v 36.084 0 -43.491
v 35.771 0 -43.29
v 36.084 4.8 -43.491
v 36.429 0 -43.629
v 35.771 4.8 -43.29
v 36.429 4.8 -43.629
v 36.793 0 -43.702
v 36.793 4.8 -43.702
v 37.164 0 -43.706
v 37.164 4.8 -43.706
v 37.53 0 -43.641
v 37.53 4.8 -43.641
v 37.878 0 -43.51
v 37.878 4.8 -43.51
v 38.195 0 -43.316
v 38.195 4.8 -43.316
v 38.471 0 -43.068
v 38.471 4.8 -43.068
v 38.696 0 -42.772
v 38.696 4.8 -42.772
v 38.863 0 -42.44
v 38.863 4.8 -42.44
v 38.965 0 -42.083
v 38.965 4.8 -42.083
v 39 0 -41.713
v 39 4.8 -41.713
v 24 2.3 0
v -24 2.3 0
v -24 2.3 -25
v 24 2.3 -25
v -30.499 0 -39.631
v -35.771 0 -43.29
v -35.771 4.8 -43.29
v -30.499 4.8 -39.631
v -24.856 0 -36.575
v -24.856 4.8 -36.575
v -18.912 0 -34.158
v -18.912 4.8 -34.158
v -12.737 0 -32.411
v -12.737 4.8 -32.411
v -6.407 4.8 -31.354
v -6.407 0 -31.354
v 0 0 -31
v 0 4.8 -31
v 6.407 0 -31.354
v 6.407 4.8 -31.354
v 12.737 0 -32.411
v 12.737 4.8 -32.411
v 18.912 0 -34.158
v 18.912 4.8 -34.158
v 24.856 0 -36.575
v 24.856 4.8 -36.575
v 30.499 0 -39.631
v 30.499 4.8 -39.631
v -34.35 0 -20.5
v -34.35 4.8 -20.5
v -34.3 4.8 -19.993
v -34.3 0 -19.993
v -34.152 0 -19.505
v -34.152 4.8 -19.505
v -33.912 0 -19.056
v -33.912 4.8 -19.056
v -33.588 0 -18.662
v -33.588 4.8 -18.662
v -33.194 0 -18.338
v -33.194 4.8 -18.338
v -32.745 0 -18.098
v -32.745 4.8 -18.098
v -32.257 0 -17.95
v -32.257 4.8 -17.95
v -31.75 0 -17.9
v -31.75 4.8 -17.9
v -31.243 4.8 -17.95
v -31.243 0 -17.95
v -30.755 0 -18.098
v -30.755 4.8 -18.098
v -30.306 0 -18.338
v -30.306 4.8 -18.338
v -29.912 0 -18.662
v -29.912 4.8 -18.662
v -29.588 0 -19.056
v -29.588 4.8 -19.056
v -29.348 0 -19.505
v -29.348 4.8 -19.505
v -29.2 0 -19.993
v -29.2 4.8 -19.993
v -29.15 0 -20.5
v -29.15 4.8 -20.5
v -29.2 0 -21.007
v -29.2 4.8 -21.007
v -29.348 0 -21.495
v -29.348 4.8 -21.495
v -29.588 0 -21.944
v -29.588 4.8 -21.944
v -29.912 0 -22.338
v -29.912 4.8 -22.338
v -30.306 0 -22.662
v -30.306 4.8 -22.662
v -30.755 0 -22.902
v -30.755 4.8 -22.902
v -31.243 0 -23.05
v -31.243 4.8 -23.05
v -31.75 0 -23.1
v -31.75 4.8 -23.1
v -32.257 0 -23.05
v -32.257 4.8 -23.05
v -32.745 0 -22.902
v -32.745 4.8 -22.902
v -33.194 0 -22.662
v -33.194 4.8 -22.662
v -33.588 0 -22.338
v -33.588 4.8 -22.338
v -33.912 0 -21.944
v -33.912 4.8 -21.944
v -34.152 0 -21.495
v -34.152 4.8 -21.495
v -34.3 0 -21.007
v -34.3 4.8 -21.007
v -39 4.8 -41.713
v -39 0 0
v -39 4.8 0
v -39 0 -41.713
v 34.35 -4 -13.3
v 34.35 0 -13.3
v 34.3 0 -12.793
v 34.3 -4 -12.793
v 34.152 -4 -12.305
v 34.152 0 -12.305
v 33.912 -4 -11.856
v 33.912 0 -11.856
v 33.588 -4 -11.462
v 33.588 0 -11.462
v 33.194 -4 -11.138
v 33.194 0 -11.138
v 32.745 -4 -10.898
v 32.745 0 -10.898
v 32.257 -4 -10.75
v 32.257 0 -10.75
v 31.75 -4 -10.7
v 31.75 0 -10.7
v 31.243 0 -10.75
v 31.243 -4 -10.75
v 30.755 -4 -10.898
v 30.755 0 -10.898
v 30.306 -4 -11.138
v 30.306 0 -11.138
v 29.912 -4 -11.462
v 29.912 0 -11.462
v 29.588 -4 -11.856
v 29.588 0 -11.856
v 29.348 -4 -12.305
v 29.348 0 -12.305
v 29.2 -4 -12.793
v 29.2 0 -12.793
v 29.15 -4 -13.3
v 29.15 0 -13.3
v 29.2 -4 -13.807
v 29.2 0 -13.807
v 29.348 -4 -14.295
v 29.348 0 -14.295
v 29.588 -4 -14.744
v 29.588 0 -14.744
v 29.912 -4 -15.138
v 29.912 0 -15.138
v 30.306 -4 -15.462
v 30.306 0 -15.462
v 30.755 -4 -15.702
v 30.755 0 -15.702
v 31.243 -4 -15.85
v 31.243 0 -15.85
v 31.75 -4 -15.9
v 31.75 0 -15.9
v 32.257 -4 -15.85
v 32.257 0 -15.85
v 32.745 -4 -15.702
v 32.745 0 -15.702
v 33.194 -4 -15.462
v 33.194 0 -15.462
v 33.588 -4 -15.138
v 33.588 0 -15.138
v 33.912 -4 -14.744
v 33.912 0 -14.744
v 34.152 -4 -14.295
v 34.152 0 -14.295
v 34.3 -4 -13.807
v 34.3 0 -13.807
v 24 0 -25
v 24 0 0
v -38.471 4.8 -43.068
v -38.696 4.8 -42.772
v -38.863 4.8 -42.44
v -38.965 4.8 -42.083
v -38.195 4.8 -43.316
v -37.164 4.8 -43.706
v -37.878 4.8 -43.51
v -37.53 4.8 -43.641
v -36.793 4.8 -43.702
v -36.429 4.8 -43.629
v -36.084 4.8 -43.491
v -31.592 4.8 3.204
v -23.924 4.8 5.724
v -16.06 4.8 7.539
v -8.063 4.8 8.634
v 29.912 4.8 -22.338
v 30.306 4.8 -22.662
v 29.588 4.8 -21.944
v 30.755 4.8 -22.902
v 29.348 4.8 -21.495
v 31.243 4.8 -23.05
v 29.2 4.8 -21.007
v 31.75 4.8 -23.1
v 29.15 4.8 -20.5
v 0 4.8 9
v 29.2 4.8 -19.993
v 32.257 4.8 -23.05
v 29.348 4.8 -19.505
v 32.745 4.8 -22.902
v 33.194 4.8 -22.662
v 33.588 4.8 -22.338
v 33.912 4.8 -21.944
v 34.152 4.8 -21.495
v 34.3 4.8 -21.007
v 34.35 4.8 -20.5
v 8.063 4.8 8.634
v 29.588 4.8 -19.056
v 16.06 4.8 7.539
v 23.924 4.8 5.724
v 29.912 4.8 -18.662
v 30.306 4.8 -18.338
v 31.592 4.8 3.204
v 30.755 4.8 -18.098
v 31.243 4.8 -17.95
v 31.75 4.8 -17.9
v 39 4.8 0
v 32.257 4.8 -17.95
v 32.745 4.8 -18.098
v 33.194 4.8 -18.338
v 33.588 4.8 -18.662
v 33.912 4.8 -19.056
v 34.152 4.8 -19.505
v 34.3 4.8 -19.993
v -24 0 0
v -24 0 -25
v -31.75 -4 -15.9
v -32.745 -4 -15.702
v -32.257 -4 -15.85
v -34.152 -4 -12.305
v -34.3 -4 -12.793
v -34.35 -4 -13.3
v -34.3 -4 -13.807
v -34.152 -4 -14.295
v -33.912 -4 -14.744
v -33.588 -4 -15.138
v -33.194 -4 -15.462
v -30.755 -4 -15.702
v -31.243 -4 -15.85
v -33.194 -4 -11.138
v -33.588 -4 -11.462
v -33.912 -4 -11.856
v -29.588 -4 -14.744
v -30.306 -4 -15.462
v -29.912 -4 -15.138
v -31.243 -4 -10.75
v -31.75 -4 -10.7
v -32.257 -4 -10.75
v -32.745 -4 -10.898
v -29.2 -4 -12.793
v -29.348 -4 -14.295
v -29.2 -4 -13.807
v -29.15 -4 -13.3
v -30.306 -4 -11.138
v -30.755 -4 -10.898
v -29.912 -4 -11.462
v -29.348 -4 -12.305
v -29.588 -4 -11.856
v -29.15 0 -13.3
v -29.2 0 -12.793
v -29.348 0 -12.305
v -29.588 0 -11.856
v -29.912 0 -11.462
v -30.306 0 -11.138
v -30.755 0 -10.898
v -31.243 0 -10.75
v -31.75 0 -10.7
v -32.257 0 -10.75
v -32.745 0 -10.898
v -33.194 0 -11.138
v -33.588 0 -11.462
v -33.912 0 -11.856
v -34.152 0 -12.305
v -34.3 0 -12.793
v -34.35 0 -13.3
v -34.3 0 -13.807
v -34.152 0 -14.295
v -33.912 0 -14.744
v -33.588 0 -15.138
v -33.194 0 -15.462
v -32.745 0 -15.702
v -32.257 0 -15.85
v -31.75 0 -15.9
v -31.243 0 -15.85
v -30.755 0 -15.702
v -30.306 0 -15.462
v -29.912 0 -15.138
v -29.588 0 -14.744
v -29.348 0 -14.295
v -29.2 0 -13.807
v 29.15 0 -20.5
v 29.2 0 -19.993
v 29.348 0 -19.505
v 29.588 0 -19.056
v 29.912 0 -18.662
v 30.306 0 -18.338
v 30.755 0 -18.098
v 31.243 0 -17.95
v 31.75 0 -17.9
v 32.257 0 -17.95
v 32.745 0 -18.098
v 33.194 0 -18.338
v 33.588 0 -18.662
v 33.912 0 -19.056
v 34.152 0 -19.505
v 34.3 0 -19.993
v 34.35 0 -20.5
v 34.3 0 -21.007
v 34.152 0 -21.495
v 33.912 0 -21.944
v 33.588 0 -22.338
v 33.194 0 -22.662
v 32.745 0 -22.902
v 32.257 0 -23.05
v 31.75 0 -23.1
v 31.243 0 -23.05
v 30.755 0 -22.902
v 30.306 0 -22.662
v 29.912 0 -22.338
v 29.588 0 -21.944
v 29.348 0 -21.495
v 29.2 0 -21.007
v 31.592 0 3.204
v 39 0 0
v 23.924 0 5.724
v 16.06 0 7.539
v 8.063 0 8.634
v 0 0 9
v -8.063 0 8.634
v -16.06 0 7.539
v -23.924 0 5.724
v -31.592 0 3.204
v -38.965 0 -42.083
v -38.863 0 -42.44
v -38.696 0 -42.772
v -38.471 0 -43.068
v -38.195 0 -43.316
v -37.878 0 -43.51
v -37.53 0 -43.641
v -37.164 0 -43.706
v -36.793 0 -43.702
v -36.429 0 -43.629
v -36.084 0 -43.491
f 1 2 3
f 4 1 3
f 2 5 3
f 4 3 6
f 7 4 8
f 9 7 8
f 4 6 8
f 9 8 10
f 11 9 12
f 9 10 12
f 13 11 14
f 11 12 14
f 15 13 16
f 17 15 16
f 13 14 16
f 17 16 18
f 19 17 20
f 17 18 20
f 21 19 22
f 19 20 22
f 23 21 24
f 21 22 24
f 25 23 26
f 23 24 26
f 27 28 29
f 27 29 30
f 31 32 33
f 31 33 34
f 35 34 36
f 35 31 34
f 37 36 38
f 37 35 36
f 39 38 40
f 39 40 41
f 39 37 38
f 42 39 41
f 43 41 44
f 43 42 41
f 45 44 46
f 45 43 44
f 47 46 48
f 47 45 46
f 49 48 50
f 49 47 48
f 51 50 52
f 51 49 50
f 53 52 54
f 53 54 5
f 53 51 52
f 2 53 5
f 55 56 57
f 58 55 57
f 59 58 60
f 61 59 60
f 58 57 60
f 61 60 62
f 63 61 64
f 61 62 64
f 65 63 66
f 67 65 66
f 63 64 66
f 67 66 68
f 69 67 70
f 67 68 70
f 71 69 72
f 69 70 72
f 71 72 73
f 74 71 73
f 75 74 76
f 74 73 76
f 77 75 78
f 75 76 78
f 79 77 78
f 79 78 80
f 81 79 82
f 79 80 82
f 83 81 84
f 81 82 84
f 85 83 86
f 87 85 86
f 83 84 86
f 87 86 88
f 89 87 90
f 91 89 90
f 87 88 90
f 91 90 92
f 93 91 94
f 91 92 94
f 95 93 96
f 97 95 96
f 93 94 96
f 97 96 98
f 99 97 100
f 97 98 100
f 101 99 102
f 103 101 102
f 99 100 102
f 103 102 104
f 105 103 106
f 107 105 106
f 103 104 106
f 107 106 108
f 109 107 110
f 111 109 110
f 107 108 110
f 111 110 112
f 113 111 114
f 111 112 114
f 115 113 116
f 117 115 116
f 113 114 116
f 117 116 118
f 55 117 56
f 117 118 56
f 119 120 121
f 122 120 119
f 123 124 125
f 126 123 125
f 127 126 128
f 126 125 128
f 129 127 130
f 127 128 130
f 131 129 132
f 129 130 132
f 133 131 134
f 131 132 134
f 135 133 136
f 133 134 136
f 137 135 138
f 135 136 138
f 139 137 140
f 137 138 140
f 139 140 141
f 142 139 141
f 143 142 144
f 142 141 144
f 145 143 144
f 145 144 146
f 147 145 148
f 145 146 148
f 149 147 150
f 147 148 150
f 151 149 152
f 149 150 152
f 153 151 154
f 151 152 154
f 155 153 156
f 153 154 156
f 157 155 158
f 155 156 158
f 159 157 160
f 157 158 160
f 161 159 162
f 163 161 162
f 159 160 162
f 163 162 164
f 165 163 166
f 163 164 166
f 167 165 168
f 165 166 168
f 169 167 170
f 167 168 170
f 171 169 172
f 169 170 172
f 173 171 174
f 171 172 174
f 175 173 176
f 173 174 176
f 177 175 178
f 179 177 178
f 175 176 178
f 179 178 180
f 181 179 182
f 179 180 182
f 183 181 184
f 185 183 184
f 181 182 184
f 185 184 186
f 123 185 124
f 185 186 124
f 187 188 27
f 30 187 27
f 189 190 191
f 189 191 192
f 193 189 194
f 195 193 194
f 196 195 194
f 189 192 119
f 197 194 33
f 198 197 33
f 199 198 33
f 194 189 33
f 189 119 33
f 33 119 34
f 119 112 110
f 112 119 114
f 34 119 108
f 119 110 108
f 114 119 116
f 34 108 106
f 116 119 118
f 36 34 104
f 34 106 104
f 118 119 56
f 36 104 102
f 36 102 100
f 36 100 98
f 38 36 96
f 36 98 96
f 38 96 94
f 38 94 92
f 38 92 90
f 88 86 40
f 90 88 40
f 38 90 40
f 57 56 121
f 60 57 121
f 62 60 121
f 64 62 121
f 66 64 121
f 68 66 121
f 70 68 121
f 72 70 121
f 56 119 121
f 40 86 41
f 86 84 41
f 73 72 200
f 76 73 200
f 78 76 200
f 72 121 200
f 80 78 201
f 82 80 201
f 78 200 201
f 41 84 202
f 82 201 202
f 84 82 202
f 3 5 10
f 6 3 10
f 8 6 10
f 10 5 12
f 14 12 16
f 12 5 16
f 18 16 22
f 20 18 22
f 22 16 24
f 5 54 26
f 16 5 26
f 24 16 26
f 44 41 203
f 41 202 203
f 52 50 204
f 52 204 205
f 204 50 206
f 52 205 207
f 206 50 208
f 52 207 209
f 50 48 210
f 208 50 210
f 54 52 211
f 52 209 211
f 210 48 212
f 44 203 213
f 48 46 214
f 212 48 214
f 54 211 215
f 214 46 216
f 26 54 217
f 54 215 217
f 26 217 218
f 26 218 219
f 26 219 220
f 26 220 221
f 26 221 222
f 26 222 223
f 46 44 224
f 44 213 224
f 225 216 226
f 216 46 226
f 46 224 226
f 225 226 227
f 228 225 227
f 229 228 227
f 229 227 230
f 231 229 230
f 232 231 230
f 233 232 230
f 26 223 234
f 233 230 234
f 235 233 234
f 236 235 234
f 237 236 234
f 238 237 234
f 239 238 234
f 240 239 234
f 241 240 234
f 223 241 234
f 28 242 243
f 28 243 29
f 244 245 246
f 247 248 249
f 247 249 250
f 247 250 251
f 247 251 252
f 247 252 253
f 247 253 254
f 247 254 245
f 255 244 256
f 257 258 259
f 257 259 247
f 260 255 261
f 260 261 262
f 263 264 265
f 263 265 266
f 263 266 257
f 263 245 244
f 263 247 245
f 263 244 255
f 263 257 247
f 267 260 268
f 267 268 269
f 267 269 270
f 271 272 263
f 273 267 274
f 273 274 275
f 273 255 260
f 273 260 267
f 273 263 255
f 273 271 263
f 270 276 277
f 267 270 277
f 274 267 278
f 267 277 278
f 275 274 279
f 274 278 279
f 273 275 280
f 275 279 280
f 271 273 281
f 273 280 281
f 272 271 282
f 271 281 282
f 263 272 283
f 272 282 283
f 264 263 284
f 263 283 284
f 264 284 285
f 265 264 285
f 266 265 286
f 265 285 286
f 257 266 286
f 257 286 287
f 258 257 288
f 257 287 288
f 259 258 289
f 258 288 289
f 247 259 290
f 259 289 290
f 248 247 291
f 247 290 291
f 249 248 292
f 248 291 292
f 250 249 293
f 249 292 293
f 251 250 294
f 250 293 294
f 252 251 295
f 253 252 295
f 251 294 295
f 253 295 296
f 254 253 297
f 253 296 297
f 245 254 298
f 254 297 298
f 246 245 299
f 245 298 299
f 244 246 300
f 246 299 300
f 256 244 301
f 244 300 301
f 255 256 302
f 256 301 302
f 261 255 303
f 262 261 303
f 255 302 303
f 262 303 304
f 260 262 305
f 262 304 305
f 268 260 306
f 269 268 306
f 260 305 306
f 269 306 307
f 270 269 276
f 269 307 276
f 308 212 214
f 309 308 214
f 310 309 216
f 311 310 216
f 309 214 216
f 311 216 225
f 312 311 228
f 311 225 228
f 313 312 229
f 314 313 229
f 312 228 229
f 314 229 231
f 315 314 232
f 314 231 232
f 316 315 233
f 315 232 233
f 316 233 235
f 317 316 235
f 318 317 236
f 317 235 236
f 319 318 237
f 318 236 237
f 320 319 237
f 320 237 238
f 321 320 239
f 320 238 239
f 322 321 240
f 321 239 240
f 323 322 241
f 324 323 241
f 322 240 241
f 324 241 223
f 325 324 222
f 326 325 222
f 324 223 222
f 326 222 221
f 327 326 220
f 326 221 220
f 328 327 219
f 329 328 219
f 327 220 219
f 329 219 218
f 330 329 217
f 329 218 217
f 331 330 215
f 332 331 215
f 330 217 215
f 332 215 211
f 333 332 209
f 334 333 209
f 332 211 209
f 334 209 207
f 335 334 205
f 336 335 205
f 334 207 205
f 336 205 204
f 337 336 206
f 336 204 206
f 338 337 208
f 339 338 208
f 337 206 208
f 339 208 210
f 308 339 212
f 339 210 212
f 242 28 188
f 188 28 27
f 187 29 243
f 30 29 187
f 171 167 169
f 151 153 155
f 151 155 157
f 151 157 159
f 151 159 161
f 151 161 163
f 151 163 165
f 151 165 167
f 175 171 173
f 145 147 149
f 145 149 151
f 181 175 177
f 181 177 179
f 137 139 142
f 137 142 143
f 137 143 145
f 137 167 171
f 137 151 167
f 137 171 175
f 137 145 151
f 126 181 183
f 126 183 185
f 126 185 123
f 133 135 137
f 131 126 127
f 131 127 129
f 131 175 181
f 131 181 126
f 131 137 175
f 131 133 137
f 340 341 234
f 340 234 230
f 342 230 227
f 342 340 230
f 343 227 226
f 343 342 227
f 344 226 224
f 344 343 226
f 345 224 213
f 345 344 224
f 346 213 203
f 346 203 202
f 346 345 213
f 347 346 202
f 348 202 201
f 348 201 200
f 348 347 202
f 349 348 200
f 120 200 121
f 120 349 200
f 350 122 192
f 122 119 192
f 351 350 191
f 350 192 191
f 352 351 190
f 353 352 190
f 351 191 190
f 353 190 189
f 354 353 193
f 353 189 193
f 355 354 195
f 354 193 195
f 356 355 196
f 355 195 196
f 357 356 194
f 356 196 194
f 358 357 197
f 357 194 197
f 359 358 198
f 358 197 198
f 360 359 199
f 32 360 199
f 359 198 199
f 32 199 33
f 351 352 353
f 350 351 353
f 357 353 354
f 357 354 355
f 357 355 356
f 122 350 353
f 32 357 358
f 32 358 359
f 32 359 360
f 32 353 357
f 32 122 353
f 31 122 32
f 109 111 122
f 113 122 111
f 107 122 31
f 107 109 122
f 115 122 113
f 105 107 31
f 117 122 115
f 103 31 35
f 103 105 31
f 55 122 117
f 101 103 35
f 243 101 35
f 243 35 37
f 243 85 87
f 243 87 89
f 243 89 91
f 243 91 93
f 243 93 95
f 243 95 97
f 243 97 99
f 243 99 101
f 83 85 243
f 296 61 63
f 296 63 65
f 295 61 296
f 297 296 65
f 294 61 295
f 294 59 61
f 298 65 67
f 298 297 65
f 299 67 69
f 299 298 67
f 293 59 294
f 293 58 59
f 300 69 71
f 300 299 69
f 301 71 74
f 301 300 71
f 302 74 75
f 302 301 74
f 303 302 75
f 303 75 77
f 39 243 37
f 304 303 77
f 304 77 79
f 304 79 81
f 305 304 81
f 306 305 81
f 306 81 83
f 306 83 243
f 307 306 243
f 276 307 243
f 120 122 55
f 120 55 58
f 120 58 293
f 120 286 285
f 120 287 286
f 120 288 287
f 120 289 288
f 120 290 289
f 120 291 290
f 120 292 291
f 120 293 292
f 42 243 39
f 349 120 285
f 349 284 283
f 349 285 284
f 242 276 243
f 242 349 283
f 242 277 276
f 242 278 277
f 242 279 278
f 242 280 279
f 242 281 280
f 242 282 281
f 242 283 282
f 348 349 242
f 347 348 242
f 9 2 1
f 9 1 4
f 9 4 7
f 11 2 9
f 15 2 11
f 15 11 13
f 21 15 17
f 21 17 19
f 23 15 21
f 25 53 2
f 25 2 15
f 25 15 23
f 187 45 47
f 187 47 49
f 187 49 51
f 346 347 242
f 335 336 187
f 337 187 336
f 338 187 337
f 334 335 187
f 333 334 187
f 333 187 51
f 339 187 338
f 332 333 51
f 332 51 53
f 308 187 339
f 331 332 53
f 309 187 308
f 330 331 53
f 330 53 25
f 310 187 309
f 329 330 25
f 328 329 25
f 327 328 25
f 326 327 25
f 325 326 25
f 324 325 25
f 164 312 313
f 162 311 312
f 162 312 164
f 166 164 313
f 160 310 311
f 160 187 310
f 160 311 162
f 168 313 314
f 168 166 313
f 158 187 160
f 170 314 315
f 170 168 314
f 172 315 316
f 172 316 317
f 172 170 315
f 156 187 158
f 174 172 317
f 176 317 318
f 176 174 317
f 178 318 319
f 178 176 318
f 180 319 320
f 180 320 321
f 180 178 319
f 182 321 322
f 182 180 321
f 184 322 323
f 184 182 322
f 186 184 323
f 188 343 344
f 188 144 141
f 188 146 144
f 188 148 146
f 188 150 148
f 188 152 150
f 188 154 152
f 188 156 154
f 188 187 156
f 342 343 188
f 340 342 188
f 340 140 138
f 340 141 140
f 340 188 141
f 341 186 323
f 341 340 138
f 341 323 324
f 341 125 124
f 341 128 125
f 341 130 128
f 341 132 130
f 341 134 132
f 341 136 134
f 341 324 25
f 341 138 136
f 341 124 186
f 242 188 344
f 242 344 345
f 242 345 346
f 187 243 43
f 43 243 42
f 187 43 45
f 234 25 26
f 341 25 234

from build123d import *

# Parameters (mm, degrees)
F1_DEPTH = 4.8
F2_R     = 2.6
F3_DEPTH = 4
F4_R     = 2.6
F5_DEPTH = 4.8
F6_R     = 2
F7_W     = 48
F7_H     = 2.3
F8_DEPTH = 25


with BuildPart() as f1:
    # F0 (on Front) → F1 (new body)
    with BuildSketch(Plane.XZ):
        with BuildLine():
            Line((-39, 0), (-39, -46))
            ThreePointArc((-39, -46), (0, -31), (39, -46))
            Line((39, -46), (39, 0))
            ThreePointArc((39, 0), (0, 9), (-39, 0))
        make_face()
    extrude(amount=-F1_DEPTH)

    # F2 (on face) → F3 (join)
    with BuildSketch(Plane.XZ):
        with Locations((-31.75, -13.3)):
            Circle(F2_R)
        with Locations((31.75, -13.3)):
            Circle(F2_R)
    extrude(amount=F3_DEPTH)

    # F4 (on face) → F5 (cut, through all)
    with BuildSketch(Plane(origin=(0, 4.8, 0), x_dir=(-1, 0, 0), z_dir=(0, 1, 0))):
        with Locations((-31.75, -20.5)):
            Circle(F4_R)
        with Locations((31.75, -20.5)):
            Circle(F4_R)
    extrude(amount=-F5_DEPTH, mode=Mode.SUBTRACT)

    # F6
    f6_edges = [f1.edges().sort_by_distance(p)[0] for p in [
        (-39, 2.4, -46),
        (39, 2.4, -46),
    ]]
    fillet(f6_edges, radius=F6_R)

    # F7 (on Top) → F8 (cut)
    with BuildSketch(Plane.XY):
        with Locations((0, 1.15)):
            Rectangle(F7_W, F7_H)
    extrude(amount=-F8_DEPTH, mode=Mode.SUBTRACT)


solid = f1.part
